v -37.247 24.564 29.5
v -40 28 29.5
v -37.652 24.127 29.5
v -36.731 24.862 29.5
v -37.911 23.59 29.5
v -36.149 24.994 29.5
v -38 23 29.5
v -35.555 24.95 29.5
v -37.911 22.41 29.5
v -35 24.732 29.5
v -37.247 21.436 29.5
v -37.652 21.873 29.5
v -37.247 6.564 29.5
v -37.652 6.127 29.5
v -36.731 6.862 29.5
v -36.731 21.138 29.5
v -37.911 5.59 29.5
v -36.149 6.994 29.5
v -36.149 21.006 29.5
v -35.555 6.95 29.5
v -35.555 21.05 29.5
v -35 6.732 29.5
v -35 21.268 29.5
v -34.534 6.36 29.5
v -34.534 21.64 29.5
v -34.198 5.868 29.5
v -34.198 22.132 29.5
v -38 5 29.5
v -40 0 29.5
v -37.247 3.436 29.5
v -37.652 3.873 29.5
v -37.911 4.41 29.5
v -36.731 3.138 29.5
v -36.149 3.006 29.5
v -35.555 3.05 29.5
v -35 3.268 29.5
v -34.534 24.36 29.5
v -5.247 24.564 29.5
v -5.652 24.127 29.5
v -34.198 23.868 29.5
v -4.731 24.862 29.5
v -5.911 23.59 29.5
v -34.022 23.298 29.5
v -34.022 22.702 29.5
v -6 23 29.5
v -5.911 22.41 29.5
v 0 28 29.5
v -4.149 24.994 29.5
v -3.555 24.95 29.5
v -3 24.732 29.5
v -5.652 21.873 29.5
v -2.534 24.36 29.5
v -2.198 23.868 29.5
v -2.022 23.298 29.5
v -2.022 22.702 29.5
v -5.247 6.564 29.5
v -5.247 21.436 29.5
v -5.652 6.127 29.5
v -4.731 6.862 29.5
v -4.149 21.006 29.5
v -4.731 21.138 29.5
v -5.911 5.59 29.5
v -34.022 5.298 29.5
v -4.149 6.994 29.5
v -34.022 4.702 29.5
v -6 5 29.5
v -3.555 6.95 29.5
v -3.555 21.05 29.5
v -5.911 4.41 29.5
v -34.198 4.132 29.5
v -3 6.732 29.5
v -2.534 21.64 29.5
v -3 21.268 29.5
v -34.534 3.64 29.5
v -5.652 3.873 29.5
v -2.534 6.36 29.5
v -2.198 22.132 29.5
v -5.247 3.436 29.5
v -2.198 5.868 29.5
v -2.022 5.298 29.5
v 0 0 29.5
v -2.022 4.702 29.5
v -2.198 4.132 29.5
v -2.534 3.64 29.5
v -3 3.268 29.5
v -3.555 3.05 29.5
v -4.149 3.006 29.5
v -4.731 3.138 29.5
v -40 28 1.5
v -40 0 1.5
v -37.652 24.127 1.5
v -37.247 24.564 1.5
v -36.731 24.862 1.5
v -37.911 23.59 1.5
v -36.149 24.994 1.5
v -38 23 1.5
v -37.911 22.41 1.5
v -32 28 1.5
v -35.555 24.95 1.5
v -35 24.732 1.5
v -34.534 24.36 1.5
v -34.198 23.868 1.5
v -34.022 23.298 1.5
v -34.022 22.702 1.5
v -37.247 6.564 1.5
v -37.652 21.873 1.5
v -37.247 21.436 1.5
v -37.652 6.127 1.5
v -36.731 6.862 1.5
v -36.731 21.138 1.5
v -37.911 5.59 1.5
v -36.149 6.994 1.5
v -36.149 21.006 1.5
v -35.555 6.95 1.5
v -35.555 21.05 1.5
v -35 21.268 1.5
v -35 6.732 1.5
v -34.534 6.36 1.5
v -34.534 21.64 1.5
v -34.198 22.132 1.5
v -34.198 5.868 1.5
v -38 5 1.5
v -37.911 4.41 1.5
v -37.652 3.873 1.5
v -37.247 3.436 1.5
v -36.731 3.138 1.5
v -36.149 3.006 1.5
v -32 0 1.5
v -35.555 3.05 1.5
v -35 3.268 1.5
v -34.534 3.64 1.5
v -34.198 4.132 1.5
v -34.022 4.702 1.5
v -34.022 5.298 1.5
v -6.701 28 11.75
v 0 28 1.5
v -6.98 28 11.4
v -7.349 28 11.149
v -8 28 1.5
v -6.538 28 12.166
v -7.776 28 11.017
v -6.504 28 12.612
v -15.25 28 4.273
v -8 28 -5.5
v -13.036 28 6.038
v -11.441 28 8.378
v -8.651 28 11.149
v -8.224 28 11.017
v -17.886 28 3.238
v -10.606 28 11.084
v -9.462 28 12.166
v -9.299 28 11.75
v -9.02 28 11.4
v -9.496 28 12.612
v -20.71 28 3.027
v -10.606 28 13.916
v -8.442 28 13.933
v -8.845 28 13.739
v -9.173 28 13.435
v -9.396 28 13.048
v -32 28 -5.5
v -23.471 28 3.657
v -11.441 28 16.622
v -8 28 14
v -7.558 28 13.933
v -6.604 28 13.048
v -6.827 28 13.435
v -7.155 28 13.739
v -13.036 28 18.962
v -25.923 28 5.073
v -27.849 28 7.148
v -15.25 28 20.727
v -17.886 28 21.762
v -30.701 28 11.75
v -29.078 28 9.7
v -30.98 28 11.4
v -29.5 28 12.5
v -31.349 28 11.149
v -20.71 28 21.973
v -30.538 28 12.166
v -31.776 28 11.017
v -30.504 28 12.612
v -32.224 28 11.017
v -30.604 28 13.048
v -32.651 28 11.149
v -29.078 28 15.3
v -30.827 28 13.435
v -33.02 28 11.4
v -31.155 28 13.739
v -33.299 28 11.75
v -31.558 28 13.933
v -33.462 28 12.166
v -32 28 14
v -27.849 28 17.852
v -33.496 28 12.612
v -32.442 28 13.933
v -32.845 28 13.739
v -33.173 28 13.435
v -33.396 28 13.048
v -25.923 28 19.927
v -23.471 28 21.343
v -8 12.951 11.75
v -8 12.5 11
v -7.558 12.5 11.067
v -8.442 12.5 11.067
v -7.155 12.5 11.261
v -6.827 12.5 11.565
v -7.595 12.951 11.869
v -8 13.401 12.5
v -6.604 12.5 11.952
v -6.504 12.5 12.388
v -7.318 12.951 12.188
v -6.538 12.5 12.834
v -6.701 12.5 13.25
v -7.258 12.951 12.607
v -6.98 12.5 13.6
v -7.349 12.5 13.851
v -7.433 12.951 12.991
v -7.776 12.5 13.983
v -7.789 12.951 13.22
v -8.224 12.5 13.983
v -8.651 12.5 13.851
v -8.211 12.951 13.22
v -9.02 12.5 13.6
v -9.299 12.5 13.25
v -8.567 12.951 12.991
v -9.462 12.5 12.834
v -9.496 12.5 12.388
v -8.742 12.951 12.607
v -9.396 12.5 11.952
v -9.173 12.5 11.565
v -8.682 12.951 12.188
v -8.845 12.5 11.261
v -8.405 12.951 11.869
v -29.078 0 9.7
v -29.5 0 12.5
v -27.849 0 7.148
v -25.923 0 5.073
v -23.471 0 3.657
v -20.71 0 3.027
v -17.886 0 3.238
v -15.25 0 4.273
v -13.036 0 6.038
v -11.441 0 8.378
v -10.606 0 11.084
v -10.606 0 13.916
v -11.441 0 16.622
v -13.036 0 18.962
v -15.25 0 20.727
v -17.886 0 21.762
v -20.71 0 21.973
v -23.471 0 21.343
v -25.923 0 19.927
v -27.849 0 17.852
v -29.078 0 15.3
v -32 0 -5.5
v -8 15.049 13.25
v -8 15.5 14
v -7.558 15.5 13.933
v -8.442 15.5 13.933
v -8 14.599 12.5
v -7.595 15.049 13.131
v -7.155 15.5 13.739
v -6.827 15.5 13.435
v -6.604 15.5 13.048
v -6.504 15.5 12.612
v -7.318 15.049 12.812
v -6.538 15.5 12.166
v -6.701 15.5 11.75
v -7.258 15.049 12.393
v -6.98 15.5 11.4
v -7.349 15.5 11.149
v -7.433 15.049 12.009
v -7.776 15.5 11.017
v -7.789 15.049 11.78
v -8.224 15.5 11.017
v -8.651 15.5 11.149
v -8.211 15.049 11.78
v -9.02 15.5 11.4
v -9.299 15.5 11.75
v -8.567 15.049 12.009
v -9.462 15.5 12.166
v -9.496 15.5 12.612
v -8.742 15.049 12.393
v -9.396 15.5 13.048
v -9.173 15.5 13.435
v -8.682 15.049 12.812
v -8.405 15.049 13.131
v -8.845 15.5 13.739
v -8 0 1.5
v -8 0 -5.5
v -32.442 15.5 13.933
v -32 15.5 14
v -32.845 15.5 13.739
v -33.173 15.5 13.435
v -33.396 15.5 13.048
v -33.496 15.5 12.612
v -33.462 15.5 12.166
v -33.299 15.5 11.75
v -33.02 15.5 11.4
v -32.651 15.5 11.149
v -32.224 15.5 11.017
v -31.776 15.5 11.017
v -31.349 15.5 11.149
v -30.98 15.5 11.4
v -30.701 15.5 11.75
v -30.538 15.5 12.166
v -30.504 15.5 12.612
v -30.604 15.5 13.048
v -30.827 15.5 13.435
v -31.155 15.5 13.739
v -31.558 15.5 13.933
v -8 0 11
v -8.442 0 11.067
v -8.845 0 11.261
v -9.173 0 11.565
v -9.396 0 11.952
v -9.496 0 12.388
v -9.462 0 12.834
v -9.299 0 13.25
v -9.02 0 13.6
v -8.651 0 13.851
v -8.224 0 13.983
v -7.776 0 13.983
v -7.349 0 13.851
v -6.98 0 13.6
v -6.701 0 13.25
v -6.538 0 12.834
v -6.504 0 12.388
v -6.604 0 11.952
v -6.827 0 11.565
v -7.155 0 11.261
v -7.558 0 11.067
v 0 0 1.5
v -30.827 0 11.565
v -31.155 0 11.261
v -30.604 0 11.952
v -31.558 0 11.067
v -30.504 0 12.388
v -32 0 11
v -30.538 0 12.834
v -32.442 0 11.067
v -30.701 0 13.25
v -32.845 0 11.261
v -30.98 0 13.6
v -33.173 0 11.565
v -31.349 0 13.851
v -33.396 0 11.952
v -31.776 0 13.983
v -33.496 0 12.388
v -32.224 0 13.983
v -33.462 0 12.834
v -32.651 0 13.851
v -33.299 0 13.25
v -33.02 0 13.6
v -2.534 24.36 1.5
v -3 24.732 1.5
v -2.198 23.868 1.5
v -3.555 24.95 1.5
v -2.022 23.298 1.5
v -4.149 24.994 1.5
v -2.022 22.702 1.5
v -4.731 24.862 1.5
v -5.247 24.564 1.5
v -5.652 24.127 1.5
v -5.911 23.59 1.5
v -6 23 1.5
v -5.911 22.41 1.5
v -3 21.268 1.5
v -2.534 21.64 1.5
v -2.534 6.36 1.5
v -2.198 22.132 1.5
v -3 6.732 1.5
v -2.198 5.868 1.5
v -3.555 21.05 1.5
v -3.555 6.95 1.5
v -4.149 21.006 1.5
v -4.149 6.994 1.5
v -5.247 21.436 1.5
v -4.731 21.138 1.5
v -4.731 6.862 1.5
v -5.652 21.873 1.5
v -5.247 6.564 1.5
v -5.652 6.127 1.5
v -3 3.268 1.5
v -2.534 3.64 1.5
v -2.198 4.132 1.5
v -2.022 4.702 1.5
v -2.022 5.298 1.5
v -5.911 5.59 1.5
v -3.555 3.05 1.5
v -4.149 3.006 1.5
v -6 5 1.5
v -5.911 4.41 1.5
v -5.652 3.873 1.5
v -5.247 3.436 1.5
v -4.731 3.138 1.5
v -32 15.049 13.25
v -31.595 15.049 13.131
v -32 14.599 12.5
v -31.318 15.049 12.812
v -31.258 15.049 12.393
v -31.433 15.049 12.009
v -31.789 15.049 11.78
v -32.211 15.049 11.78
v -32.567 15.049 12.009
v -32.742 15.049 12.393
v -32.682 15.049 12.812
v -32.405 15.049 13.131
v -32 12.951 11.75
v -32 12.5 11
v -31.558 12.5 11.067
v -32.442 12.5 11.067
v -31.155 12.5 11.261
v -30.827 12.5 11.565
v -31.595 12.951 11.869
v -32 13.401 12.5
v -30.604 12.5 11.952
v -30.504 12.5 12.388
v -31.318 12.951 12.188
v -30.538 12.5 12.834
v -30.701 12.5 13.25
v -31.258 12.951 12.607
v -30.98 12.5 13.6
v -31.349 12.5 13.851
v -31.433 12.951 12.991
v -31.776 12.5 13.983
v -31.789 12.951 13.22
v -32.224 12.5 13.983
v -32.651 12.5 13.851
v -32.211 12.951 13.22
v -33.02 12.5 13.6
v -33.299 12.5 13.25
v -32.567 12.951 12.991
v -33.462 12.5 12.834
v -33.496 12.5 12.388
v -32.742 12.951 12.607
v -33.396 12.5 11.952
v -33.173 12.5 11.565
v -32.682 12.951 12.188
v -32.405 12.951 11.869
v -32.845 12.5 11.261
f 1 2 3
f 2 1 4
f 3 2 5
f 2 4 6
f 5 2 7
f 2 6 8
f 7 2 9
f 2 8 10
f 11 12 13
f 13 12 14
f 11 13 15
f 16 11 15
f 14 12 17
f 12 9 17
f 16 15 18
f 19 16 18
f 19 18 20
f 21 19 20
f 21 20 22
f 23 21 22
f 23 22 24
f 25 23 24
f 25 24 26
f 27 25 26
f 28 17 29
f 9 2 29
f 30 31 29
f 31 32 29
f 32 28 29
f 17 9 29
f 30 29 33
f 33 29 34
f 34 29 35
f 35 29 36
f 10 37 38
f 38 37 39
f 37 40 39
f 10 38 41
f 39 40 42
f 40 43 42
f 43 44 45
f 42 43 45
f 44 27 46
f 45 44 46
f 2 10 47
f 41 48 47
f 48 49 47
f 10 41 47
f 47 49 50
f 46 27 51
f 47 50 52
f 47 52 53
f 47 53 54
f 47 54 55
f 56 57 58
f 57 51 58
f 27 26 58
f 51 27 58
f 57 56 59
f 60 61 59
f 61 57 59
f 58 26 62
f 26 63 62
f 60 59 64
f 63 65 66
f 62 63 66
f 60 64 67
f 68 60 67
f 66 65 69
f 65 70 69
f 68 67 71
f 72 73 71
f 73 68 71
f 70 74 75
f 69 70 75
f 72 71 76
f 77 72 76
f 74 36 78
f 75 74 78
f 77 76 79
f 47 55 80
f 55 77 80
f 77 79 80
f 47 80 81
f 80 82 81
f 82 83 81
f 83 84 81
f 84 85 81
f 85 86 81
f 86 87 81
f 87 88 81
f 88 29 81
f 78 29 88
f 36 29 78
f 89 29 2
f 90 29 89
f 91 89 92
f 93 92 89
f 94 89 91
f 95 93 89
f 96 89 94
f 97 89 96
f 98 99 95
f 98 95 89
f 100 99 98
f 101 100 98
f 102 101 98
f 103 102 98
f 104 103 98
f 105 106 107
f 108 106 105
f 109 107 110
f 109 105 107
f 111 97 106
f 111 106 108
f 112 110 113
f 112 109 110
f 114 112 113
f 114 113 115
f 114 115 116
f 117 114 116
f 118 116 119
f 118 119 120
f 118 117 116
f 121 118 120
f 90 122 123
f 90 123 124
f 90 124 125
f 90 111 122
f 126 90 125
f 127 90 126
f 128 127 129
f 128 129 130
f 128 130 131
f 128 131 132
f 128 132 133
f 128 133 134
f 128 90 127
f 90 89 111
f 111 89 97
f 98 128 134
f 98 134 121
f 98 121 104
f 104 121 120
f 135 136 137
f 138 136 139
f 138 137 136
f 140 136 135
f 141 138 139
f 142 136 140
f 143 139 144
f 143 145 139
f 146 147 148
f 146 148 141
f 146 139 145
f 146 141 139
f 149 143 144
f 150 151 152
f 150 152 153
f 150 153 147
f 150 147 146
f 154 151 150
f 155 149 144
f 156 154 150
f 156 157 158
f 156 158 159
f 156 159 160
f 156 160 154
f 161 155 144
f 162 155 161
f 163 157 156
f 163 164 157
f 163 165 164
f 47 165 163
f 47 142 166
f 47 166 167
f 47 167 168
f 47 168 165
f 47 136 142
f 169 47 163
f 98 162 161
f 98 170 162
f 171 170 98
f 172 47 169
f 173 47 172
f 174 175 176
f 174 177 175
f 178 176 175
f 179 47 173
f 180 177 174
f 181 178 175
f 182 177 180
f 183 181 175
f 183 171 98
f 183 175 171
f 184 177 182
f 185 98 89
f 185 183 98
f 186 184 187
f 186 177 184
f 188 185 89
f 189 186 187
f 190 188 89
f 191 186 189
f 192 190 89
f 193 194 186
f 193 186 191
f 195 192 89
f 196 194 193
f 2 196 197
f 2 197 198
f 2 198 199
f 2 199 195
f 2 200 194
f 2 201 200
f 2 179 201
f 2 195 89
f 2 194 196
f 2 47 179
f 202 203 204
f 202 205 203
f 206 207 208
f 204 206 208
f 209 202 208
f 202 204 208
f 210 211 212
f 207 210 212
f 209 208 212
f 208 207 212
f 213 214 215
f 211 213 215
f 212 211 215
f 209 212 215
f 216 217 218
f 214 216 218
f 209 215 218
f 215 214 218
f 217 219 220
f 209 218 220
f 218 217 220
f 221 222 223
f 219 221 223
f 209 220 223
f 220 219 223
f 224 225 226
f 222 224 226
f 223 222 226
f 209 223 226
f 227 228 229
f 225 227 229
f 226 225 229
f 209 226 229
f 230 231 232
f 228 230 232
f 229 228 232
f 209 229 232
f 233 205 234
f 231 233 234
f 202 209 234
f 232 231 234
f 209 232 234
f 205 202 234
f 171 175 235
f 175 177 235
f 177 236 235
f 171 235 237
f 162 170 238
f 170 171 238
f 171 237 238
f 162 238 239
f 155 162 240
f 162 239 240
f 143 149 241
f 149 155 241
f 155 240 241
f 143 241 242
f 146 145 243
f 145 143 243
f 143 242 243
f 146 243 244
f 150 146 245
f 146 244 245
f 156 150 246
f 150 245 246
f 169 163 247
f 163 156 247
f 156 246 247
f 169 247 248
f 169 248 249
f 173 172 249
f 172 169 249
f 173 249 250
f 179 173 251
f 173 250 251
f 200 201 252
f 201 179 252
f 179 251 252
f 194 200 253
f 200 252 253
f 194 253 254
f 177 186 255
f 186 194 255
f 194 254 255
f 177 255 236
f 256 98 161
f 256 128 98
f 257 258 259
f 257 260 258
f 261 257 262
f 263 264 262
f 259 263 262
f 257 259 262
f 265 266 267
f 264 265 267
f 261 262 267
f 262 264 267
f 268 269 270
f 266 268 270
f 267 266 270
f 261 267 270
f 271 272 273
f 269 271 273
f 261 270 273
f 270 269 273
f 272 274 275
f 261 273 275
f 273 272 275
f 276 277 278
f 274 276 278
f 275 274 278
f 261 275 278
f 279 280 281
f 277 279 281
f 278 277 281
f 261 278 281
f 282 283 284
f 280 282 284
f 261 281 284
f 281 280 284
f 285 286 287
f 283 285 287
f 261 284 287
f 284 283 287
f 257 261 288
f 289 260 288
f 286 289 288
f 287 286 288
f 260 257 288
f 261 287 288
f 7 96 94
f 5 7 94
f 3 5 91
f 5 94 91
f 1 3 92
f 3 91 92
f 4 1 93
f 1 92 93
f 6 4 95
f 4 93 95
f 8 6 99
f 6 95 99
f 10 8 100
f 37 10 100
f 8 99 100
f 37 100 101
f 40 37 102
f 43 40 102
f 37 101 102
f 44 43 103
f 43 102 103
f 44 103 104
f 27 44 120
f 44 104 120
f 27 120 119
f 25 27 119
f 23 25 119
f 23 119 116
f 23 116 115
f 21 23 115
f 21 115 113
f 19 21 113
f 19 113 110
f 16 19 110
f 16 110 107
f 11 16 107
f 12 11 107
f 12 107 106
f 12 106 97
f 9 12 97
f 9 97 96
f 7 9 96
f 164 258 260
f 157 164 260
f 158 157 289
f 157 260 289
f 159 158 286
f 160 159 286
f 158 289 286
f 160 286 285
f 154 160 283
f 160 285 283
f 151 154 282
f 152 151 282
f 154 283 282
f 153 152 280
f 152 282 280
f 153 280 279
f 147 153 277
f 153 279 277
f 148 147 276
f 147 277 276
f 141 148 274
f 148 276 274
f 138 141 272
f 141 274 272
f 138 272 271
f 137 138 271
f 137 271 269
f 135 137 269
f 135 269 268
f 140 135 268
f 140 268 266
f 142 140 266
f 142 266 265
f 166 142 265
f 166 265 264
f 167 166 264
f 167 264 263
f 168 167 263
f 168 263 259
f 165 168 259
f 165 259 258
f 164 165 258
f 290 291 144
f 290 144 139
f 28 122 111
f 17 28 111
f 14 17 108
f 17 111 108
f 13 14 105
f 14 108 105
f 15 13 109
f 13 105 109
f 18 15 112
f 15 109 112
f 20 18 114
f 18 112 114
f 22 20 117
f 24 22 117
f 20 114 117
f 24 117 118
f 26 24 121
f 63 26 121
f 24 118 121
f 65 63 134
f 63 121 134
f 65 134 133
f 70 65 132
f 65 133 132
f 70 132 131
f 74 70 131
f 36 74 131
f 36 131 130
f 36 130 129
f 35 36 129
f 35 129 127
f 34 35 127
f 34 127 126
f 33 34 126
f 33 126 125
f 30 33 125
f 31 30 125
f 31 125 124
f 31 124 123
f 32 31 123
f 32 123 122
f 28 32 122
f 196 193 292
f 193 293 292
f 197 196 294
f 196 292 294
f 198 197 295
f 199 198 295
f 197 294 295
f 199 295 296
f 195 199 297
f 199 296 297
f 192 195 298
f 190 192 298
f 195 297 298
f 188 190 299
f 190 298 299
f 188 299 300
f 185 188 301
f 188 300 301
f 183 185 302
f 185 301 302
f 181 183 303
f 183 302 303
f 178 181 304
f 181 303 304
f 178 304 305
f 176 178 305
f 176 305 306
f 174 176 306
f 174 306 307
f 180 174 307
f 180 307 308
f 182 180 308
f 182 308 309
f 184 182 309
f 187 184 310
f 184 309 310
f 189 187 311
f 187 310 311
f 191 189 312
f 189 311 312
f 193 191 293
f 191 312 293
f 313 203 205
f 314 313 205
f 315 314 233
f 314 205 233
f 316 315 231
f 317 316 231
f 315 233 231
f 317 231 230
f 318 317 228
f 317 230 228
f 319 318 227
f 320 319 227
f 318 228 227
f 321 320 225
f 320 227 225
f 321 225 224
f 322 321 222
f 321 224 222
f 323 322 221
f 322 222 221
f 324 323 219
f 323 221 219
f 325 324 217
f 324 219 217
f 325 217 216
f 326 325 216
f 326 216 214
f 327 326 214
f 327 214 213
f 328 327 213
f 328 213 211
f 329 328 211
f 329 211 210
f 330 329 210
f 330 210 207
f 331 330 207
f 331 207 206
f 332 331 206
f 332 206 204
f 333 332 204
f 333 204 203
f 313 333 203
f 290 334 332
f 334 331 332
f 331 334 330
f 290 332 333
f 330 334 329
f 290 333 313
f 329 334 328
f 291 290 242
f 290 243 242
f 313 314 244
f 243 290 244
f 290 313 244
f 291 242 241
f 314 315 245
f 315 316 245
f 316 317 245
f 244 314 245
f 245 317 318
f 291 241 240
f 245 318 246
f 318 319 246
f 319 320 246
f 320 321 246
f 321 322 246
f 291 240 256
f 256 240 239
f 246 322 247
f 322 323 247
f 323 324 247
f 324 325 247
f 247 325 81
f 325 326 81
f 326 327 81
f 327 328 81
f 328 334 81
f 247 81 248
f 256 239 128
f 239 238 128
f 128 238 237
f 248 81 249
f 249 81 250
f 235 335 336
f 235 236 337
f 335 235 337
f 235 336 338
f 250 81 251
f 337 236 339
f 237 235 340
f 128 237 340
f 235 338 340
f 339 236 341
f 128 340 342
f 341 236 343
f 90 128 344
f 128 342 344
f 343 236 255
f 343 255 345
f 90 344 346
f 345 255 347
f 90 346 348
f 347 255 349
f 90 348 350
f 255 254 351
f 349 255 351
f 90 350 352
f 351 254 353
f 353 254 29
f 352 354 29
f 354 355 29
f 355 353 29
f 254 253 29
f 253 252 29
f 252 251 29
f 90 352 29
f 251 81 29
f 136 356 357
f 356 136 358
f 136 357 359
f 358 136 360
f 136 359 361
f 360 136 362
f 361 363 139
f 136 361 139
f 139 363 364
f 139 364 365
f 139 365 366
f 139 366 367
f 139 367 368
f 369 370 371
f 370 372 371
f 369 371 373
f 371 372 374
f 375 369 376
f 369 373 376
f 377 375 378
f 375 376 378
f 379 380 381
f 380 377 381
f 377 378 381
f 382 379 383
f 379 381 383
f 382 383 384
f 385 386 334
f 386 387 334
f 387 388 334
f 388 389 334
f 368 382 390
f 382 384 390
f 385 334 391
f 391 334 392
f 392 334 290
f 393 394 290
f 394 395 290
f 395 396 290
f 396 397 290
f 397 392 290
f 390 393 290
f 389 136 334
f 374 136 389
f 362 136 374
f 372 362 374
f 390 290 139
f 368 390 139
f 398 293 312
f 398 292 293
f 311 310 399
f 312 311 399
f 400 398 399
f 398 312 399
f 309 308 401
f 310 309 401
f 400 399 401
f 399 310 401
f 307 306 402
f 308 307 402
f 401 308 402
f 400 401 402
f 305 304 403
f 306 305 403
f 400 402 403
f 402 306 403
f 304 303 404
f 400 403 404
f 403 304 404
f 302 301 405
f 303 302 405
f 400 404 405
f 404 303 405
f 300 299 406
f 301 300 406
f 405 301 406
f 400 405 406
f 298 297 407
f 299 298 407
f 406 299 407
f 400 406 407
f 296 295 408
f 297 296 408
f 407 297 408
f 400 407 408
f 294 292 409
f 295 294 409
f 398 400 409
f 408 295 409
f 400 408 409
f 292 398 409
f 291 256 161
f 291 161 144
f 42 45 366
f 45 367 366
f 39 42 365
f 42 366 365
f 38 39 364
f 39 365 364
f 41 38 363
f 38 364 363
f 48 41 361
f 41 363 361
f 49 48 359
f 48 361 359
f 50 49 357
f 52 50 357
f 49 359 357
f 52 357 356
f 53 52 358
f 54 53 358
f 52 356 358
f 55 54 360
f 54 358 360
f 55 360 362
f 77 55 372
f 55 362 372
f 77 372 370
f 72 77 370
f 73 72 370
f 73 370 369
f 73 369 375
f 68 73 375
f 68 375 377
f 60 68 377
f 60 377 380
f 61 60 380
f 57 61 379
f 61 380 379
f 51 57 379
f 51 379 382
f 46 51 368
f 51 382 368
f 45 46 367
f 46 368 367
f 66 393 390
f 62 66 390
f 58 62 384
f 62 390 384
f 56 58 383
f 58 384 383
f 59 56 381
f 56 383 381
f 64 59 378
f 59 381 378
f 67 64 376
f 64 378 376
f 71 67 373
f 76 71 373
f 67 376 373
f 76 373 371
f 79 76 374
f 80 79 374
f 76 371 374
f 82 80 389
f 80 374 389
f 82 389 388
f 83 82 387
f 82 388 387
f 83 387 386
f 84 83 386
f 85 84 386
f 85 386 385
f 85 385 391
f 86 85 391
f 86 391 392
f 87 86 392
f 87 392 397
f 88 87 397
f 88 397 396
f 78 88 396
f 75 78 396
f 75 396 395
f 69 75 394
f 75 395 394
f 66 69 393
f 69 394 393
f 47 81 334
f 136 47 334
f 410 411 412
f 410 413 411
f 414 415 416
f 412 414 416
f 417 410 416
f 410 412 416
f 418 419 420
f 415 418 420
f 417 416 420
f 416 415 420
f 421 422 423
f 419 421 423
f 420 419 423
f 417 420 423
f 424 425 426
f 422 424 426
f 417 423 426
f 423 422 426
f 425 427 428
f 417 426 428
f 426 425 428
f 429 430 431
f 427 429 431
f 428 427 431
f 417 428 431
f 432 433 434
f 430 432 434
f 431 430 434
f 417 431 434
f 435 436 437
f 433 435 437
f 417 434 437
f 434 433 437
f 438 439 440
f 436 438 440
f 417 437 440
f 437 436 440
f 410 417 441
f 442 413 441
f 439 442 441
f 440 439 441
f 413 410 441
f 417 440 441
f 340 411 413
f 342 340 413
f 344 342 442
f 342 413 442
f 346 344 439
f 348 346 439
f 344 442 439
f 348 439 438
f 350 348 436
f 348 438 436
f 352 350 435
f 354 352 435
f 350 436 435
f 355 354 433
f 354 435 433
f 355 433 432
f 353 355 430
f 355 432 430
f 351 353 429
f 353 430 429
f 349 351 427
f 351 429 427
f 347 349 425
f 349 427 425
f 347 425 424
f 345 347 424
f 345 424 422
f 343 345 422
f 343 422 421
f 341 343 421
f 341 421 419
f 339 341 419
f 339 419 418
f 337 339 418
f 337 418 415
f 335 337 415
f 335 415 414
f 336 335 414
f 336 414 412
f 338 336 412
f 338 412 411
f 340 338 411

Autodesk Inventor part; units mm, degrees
ref_plane "YZ Plane" through (0, 0, 0) normal (1, 0, 0) x (0, 1, 0)
ref_plane "XZ Plane" through (0, 0, 0) normal (0, 1, 0) x (-1, 0, 0)
ref_plane "XY Plane" through (0, 0, 0) normal (0, 0, 1) x (1, 0, 0)
sketch "Boceto1" plane through (0, 0, 0) normal (0, 1, 0) x (-1, 0, 0)
  line L0 (40, 11) -> (40, 29.5)
  line L1 (40, 29.5) -> (0, 29.5)
  line L2 (0, 29.5) -> (0, 7.5)
  circle A0 centre (20, 12.5) radius 9.5
  line L3 (40, 11) -> (40, 1.5)
  line L4 (40, 1.5) -> (32, 1.5)
  line L5 (0, 7.5) -> (0, 1.5)
  line L6 (0, 1.5) -> (8, 1.5)
  line L7 (32, 1.5) -> (32, -5.5)
  line L8 (32, -5.5) -> (8, -5.5)
  line L9 (8, -5.5) -> (8, 1.5)
  point P0 (0, 0)
  point P1 (0, 0)
  dimension "d1" = 19
  dimension "d14" = 40
  dimension "d18" = 8
  dimension "d19" = 8
  dimension "d20" = 28
  dimension "d21" = 35
  dimension "d35" = 17
  dimension "d68" = 28
extrude "Extrusión1" add sketch "Boceto1" along normal blind 28
sketch "Boceto7" plane through (0, 0, 1.5) normal (0, 0, -1) x (-1, 0, 0)
  line L0 (0, 0) -> (0, 28) projected
  line L1 (0, 0) -> (4, 0)
  line L2 (40, 0) -> (0, 0) projected
  line L3 (4, 0) -> (4, 28)
  line L4 (40, 28) -> (0, 28) projected
  line L5 (4, 14) -> (4, 5)
  circle A0 centre (4, 5) radius 2
  circle A1 centre (4, 23) radius 2
  line L6 (40, 0) -> (40, 28) projected
  line L7 (40, 0) -> (36, 0)
  line L8 (36, 0) -> (36, 28)
  circle A2 centre (36, 5) radius 2
  circle A3 centre (36, 23) radius 2
  dimension "d24" = 4
  dimension "d25" = 4
  dimension "d26" = 5
  dimension "d27" = 5
  dimension "d28" = 4
  dimension "d29" = 4
  dimension "d30" = 4
  dimension "d31" = 5
  dimension "d32" = 5
  dimension "d60" = 4
extrude "Extrusión4" cut sketch "Boceto7" against normal blind 28 contours A0 L3 | L3 A0 | A1 L3 | L3 A1 | A2 L8 | L8 A2 | A3 L8 | L8 A3
sketch "Boceto9" plane through (0, 28, 0) normal (0, 1, 0) x (1, 0, 0)
  circle A0 centre (-20, -12.5) radius 9.5 projected
  circle A1 centre (-8, -12.5) radius 1.5
  circle A2 centre (-32, -12.5) radius 1.5
  point P0 (0, 0)
  dimension "d36" = 12
  dimension "d38" = 3
  dimension "d39" = 3
  dimension "d61" = 12
sketch "Boceto10" plane through (0, 0, 0) normal (0, -1, 0) x (1, 0, 0)
  circle A0 centre (-20, 12.5) radius 9.5 projected
  line L0 (-20, 12.5) -> (-8, 12.5)
  line L1 (-8, 12.5) -> (-32, 12.5)
  circle A1 centre (-32, 12.5) radius 1.5
  circle A2 centre (-8, 12.5) radius 1.5
  point P0 (0, 0)
  dimension "d40" = 12
  dimension "d41" = 24
  dimension "d42" = 3
  dimension "d43" = 3
hole "Agujero1" at (-32, 0, 12.5) at (-8, 0, 12.5) direction (0, 1, 0) diameter 3 depth 12.5 tip angle 118
hole "Agujero2" at (-8, 28, 12.5) at (-32, 28, 12.5) direction (0, -1, 0) diameter 3 depth 12.5 tip angle 118
thread "Rosca1" size "M3x0.5" class "6H" standard "ISO Metric profile" length 10
thread "Rosca2" size "M3x0.5" class "6H" standard "ISO Metric profile" length 10
thread "Rosca3" size "M3x0.5" class "6H" standard "ISO Metric profile" length 10
thread "Rosca4" size "M3x0.5" class "6H" standard "ISO Metric profile" length 10
equation "\"d68\" = d20"
properties part number "Soporte de Buje" material "Aluminum 6061"
